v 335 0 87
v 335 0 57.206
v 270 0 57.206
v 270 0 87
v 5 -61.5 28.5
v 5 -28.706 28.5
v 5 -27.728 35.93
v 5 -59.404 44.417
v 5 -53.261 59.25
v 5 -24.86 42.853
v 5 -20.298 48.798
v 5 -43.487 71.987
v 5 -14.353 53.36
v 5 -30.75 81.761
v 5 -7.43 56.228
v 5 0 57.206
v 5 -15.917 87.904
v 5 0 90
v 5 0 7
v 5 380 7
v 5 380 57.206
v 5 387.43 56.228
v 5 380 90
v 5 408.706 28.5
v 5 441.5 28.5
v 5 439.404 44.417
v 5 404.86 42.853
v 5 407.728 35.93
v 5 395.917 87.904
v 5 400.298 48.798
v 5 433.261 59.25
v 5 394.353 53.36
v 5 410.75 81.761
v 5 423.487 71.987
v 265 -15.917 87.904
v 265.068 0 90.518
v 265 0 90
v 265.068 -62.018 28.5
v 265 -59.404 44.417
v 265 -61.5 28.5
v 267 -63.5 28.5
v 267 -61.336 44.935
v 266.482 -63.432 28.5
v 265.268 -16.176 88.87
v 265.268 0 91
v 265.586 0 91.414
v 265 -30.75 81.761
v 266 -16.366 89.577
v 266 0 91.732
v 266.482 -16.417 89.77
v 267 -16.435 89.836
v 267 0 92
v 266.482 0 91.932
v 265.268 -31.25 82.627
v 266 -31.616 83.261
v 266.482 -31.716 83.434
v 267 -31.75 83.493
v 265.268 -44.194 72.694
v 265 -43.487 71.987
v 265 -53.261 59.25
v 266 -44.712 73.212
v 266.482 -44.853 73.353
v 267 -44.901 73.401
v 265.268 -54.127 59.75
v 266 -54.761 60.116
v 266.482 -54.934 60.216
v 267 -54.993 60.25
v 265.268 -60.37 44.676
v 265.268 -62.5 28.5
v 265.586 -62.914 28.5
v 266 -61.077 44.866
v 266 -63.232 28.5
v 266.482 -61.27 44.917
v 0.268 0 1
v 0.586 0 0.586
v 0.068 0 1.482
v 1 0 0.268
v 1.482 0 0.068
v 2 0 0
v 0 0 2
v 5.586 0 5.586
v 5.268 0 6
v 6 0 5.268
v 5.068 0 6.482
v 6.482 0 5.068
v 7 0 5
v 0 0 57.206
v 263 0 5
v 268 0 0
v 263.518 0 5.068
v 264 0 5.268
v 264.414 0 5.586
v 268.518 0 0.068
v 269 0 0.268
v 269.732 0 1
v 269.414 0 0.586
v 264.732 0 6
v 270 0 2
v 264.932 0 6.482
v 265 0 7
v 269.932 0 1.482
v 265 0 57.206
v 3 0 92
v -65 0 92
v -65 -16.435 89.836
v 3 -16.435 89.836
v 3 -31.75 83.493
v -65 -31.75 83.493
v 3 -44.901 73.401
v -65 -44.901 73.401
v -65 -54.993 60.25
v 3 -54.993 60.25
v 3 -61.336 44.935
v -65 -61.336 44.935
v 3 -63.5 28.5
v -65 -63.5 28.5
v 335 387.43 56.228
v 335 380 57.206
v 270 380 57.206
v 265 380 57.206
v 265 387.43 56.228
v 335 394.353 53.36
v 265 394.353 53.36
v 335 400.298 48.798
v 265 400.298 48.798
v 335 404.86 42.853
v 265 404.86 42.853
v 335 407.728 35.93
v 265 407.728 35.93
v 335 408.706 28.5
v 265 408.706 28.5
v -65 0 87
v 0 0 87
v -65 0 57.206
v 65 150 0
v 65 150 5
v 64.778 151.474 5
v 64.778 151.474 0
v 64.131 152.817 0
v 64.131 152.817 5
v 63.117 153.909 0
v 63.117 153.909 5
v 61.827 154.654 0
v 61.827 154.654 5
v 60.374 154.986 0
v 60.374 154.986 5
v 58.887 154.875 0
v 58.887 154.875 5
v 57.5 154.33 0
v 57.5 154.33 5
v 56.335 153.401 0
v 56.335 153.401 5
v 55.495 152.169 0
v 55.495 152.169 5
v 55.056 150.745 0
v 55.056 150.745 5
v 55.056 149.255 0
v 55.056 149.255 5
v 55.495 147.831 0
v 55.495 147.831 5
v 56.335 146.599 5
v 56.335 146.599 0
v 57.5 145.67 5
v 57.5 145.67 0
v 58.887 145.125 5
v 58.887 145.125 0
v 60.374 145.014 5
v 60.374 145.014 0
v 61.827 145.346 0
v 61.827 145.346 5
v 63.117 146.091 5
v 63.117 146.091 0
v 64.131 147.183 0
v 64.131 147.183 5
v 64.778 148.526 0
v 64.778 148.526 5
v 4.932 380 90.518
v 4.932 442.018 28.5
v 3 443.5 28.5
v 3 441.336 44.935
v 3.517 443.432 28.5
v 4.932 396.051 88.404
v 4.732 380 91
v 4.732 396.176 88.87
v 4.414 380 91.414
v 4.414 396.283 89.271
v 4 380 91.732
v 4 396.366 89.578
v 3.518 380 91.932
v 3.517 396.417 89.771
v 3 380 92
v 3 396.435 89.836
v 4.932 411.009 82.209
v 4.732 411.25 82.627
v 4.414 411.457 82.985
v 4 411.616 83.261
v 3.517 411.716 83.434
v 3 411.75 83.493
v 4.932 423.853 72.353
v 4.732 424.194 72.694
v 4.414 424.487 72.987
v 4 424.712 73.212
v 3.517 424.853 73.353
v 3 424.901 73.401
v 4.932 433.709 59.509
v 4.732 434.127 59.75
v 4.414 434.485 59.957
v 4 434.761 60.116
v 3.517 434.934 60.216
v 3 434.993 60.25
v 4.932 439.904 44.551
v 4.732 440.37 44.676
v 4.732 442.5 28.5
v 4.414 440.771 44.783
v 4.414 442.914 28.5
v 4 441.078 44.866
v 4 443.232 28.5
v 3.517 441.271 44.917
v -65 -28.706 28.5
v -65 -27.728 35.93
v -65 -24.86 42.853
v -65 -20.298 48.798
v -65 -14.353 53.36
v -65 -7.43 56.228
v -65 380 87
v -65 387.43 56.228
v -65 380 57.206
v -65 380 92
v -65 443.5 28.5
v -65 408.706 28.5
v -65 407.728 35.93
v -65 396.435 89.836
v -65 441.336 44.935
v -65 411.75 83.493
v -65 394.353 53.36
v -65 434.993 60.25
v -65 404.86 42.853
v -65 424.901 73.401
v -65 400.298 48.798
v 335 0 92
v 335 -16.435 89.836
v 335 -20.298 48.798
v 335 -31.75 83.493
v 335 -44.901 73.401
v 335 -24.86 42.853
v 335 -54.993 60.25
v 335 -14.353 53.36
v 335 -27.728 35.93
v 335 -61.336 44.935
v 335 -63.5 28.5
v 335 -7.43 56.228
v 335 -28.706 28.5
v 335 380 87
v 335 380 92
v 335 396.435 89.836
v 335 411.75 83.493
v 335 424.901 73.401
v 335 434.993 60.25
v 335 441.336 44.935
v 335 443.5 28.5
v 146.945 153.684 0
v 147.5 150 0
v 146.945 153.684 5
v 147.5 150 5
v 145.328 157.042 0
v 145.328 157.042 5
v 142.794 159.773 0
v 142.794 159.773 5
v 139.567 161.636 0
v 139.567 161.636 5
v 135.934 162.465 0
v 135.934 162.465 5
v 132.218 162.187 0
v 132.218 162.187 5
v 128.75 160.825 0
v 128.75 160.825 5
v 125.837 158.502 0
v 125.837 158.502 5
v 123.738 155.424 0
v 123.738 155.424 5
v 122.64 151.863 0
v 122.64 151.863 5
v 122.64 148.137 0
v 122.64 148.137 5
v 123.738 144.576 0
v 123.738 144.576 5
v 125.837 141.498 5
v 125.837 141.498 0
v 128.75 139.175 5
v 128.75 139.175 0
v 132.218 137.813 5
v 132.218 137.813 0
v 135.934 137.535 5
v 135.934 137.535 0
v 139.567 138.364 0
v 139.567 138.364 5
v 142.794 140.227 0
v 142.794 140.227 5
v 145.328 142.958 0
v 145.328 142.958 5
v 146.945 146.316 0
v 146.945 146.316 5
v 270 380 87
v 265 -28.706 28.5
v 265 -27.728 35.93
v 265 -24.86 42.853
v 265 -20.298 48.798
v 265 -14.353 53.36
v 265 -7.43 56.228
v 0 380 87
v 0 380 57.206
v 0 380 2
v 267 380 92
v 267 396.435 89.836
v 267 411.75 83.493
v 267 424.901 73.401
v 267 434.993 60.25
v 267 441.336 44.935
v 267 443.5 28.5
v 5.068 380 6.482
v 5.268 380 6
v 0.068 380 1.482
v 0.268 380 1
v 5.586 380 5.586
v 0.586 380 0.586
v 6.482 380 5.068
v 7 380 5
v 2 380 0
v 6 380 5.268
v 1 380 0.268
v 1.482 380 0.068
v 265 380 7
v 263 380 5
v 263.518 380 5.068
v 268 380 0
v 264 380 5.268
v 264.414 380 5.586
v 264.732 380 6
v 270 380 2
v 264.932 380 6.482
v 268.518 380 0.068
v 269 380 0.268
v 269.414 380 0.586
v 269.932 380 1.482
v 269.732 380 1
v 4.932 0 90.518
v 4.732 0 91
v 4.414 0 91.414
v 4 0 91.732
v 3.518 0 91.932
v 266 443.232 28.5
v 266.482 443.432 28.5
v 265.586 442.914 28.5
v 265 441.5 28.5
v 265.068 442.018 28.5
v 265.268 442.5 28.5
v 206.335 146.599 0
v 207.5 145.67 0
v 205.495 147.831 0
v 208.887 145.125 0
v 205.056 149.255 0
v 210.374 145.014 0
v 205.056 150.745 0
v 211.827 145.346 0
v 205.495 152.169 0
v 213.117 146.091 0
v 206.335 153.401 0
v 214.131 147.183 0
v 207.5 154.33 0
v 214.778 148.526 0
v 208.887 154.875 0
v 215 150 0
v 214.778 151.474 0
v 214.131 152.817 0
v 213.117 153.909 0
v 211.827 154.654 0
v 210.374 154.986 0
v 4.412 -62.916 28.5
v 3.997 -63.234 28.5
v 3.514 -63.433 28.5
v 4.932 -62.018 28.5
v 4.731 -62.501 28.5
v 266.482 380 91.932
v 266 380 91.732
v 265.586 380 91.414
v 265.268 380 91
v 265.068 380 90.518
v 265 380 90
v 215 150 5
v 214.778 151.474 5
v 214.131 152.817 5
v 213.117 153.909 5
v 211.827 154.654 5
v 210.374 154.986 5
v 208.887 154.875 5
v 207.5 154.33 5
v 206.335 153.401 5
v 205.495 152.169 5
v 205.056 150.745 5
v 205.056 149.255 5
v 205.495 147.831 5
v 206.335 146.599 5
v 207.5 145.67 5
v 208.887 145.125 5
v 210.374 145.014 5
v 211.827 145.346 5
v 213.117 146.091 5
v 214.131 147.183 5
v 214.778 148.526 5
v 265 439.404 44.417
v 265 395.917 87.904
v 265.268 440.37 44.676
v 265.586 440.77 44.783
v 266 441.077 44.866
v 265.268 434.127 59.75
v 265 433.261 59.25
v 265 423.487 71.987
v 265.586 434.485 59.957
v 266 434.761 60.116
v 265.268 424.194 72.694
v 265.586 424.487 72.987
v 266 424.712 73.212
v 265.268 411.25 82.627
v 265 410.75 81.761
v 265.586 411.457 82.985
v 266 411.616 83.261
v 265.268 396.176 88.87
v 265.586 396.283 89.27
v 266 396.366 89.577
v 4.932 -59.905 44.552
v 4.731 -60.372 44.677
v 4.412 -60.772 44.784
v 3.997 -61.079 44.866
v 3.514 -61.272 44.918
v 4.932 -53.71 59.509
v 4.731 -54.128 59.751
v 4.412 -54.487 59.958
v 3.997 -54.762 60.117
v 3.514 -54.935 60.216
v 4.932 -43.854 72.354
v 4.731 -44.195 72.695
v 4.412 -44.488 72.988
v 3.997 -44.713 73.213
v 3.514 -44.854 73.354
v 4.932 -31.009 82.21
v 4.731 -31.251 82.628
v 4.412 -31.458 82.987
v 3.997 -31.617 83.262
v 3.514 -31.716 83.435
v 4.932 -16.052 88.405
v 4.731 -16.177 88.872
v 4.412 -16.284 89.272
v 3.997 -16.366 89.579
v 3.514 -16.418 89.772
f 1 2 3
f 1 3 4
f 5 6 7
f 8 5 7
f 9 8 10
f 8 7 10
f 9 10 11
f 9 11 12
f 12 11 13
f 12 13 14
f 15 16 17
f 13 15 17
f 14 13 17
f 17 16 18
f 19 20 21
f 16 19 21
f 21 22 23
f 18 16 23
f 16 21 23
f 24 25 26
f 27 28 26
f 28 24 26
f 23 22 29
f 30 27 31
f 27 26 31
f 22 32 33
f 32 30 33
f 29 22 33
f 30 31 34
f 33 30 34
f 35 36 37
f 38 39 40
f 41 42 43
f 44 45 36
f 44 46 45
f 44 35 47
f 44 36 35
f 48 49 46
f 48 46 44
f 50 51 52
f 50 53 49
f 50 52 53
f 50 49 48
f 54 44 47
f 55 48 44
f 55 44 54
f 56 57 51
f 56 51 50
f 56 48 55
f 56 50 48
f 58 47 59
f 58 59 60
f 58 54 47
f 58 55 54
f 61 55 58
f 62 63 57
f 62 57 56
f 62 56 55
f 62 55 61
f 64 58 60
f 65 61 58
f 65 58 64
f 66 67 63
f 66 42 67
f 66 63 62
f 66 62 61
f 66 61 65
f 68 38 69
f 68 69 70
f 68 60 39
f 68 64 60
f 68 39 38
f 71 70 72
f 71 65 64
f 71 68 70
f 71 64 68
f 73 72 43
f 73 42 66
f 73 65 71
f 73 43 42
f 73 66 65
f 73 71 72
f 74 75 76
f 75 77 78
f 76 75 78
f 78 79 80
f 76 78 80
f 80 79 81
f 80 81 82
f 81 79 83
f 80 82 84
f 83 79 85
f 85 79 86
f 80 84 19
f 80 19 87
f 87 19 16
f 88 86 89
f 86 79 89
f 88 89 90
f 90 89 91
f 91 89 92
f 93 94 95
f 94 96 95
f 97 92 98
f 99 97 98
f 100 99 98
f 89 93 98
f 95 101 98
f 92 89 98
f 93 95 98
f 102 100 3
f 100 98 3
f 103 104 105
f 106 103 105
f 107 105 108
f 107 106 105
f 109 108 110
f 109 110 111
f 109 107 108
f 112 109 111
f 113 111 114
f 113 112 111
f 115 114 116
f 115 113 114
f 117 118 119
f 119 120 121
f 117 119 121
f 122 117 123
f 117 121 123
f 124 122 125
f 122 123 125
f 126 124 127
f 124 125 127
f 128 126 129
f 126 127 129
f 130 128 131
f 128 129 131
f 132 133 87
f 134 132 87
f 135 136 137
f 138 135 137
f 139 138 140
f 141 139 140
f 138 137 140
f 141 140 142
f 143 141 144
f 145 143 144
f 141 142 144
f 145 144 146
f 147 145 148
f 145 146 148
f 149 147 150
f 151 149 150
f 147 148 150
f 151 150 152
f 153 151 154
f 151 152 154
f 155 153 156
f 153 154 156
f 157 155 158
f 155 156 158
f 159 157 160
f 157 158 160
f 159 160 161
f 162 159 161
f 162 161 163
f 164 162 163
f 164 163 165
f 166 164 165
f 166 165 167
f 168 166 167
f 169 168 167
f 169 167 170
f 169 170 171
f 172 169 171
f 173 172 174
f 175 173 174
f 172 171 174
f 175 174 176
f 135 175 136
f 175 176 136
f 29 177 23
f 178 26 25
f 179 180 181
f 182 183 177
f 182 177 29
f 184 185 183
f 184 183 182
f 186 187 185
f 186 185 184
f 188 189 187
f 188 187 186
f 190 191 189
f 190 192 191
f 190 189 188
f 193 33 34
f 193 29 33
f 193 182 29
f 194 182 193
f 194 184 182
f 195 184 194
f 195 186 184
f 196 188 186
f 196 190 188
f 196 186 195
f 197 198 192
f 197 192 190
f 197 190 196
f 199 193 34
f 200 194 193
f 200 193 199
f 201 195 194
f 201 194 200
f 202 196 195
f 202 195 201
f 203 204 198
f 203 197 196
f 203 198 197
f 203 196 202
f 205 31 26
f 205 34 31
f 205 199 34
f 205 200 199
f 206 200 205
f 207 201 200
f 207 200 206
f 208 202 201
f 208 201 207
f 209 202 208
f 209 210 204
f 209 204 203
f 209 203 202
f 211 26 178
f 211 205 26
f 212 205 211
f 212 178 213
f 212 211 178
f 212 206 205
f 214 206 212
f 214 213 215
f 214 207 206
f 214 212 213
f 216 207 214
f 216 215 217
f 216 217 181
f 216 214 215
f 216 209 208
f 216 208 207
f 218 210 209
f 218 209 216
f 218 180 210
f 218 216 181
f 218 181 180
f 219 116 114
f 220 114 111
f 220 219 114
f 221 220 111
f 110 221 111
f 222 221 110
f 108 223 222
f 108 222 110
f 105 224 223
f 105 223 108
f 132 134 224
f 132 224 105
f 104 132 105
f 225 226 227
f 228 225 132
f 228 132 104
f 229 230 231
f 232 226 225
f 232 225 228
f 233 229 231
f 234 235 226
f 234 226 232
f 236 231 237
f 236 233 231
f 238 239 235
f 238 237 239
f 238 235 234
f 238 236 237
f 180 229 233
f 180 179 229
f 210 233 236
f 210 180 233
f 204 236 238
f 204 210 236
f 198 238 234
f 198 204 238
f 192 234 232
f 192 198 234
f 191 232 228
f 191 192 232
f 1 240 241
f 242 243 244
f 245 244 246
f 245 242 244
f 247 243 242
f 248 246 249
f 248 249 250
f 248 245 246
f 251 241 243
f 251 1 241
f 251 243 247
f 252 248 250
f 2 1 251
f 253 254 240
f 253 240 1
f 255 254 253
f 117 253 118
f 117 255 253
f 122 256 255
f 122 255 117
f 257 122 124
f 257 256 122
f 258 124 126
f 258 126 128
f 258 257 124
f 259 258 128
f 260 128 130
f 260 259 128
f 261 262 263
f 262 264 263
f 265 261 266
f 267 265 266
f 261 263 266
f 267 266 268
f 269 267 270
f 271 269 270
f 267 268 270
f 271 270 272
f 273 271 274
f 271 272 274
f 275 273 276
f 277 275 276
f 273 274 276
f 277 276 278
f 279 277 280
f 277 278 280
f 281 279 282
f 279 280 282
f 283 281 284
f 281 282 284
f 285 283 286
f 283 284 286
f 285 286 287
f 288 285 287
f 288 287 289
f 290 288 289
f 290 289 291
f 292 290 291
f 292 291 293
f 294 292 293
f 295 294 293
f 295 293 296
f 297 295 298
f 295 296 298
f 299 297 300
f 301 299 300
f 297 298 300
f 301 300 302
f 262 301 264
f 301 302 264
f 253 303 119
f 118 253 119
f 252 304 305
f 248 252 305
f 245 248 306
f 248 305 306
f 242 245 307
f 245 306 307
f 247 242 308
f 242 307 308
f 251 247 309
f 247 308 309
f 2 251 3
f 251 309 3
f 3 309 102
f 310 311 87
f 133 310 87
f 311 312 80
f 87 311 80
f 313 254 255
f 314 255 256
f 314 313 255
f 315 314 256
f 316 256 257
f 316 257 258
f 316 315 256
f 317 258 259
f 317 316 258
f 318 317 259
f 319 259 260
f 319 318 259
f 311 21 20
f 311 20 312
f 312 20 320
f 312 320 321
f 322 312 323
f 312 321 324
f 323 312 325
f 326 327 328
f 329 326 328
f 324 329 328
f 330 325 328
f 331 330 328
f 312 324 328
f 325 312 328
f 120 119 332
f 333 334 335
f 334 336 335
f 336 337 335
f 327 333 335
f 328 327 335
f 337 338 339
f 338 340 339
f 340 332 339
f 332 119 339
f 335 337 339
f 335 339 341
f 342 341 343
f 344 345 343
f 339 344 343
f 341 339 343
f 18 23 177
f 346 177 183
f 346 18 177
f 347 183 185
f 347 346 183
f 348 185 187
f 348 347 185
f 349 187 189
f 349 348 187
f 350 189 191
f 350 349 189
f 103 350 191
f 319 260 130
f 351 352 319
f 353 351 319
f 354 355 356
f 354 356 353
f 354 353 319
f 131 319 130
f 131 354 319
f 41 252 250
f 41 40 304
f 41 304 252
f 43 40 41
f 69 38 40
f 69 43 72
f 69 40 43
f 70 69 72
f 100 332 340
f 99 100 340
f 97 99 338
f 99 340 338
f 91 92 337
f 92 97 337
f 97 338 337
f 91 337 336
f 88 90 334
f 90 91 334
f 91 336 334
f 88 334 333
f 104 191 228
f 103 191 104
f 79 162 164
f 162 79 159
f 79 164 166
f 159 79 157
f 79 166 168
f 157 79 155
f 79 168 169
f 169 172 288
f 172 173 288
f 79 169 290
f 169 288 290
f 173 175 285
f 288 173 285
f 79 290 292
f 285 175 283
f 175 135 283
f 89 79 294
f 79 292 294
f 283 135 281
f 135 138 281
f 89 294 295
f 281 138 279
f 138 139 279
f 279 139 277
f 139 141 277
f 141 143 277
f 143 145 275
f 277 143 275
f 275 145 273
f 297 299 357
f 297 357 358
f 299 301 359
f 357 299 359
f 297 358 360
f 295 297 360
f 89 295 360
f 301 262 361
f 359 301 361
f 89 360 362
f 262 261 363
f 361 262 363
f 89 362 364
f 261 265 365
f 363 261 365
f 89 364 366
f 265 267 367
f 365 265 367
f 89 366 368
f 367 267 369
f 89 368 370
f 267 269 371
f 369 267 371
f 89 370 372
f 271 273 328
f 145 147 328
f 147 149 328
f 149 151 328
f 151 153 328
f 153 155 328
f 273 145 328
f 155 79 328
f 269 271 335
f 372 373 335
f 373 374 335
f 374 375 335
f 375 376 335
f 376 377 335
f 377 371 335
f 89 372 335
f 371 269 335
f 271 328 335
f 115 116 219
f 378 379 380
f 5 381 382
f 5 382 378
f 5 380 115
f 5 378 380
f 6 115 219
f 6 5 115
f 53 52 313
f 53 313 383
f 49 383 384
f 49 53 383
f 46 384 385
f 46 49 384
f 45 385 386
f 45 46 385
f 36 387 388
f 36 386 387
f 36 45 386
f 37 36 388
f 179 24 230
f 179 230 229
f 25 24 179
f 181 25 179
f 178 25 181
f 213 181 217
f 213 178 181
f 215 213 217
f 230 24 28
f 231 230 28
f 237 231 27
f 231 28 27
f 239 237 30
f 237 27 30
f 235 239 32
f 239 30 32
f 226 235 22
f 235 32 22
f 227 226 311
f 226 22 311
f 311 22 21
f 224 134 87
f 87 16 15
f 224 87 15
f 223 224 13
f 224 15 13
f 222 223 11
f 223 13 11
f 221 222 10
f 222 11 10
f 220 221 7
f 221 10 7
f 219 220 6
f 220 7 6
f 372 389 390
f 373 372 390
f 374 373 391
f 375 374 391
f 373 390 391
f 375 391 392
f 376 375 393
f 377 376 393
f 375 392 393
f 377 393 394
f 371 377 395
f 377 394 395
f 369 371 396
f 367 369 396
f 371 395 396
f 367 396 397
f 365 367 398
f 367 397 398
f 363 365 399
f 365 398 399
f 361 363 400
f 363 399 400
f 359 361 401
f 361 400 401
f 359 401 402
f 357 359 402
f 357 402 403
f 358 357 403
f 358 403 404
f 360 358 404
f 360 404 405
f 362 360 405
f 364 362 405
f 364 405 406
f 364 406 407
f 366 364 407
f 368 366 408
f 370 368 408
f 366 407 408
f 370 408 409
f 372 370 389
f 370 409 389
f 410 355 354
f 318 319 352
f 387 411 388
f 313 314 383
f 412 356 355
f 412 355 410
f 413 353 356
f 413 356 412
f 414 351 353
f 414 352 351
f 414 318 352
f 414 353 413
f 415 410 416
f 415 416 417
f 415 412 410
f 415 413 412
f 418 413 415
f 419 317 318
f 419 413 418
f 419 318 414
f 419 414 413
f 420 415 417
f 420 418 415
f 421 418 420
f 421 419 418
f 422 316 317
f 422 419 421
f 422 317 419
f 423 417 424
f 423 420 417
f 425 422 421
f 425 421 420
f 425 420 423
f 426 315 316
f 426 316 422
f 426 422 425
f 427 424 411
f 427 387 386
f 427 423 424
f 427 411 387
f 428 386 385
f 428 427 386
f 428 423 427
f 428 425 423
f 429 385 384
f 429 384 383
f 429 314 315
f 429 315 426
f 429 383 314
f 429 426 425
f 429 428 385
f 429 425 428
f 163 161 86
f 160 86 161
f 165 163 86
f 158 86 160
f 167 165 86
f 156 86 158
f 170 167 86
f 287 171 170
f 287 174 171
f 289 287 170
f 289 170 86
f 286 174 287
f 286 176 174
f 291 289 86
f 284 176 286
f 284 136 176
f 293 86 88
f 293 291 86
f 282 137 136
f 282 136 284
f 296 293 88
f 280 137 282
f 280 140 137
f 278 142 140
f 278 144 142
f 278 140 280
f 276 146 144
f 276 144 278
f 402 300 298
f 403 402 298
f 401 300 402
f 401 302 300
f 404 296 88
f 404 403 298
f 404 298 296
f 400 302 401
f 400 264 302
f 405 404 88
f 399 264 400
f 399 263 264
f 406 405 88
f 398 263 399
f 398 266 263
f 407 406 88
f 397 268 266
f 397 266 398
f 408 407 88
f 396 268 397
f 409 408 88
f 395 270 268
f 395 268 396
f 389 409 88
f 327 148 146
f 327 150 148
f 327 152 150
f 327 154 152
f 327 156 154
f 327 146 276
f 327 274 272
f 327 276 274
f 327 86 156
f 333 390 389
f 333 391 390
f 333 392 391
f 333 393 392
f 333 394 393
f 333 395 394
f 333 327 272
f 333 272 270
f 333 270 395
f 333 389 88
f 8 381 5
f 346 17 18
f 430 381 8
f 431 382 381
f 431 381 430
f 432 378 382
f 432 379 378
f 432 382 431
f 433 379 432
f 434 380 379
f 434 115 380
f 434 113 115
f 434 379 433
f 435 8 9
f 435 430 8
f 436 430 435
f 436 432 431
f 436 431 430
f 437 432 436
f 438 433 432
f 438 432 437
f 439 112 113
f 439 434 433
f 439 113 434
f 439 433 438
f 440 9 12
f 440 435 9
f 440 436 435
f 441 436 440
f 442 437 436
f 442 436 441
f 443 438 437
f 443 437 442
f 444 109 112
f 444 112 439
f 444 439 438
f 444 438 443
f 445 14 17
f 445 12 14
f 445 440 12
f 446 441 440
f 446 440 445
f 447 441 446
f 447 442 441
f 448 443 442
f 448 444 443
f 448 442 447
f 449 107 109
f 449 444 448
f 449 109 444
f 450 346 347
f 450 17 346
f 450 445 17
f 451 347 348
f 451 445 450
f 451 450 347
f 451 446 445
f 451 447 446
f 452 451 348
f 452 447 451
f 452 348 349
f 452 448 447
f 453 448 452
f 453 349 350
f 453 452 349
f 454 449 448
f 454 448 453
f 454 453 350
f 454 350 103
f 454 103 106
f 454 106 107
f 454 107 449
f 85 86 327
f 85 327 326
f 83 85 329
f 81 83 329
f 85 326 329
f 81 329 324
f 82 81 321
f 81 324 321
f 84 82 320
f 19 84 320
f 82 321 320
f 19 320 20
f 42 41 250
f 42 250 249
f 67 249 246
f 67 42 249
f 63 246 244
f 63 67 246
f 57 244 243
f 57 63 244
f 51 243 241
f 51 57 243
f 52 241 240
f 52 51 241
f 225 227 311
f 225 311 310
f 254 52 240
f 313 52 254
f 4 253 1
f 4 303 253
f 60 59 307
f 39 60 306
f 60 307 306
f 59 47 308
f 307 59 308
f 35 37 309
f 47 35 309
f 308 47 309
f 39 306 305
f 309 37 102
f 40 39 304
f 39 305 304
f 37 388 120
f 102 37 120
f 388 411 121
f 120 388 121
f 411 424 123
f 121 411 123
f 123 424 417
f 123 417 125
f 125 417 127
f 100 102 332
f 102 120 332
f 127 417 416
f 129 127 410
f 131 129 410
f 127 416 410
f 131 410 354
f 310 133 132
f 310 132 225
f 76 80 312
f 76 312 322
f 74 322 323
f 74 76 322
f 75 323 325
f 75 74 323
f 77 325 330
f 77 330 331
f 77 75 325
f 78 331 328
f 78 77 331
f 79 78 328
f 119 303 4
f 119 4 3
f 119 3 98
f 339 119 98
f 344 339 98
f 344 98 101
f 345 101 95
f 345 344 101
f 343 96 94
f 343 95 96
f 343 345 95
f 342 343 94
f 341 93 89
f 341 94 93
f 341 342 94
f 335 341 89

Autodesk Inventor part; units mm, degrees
ref_plane "XY Plane" through (0, 0, 0) normal (0, 0, 1) x (1, 0, 0)
sketch "Sketch1" plane through (0, 0, 0) normal (0, 0, 1) x (1, 0, 0)
  line L0 (0, 0) -> (270, 0)
  line L1 (270, 0) -> (270, 380)
  line L2 (270, 380) -> (0, 380)
  line L3 (0, 380) -> (0, 0)
  dimension "d0" = 270
  dimension "d1" = 380
extrude "Extrusion1" add sketch "Sketch1" along normal blind 5
sketch "Sketch4" plane through (0, 0, 0) normal (-1, 0, 0) x (0, 0, 1)
  line L0 (0, 0) -> (0, 380) projected
  line L1 (-3.8919, 9.8795) -> (0, 9.8795)
  line L2 (0, 9.8795) -> (0, 5.6882)
  line L3 (0, 5.6882) -> (-3.8919, 5.6882)
  line L4 (-3.8919, 5.6882) -> (-3.8919, 9.8795)
  line L5 (5, 0) -> (5, 380) projected
  line L6 (5, 380) -> (87, 380)
  line L7 (87, 380) -> (87, 0)
  line L8 (87, 0) -> (5, 0)
  line L9 (5, 0) -> (5, 380)
  dimension "d4" = 82
  dimension "d5" = 380
extrude "Extrusion2" add sketch "Sketch4" against normal blind 5 contours L5 L6 L7 L8
sketch "Sketch7" plane through (0, 0, 0) normal (-1, 0, 0) x (0, 0, 1)
  line L0 (0, 380) -> (87, 380) projected
  line L1 (87, 380) -> (92, 380)
  line L2 (92, 380) -> (92, 0)
  line L3 (92, 0) -> (87, 0)
  line L4 (87, 0) -> (87, 380)
  point P0 (0, 0)
  dimension "d8" = 5
  dimension "d9" = 380
extrude "Extrusion3" add sketch "Sketch7" along normal blind 65 and the other way blind 5
sketch "Sketch8" plane through (0, 0, 0) normal (-1, 0, 0) x (0, 0, 1)
  line L0 (0, 380) -> (5, 380) projected
  line L1 (0, 380) -> (0, 390)
  line L2 (0, 390) -> (1.5922, 390)
  line L3 (5, 380) -> (92, 380) projected
  arc A0 (92, 380) -> (28.5, 443.5) centre (28.5, 380) ccw
  line L4 (28.5, 408.706) -> (28.5, 443.5)
  line L5 (57.206, 380) -> (92, 380)
  arc A1 (57.206, 380) -> (28.5, 408.706) centre (28.5, 380) ccw
  arc A2 (1.5922, 390) -> (0, 383.4325) centre (28.5, 380) ccw
  point P0 (0, 0)
  dimension "d14" = 10
extrude "Extrusion4" add sketch "Sketch8" along normal blind 65 and the other way blind 5 contours A1 L4 A0 L3
ref_plane "Work Plane1" through (0, 190, 0) normal (0, 1, 0) x (-1, 0, 0)
mirror "Mirror1" about plane through (0, 190, 0) normal (0, 1, 0) of "Extrusion4"
ref_plane "Work Plane3" through (135, 0, 0) normal (1, 0, 0) x (0, 1, 0)
mirror "Mirror2" about plane through (135, 0, 0) normal (1, 0, 0) of "Extrusion4", "Extrusion3", "Mirror1", "Extrusion2"
fillet "Fillet1" radius 2 3 edges at (5, -44.9013, 73.4013) (5, 424.9013, 73.4013) (5, 190, 92)
fillet "Fillet2" radius 2 3 edges at (265, 190, 92) (265, -44.9013, 73.4013) (265, 424.9013, 73.4013)
fillet "Fillet3" radius 2 1 edges at (5, 190, 5)
fillet "Fillet4" radius 2 1 edges at (265, 190, 5)
fillet "Fillet5" radius 2 1 edges at (0, 190, 0)
fillet "Fillet6" radius 2 1 edges at (270, 190, 0)
sketch "Sketch9" plane through (0, 0, 5) normal (0, 0, 1) x (1, 0, 0)
  line L0 (7, 0) -> (263, 0) construction
  line L1 (135, 0) -> (135, 150) construction
  circle A0 centre (135, 150) radius 12.5
  line L2 (135, 150) -> (258, 150) construction
  line L3 (135, 150) -> (12, 150) construction
  circle A1 centre (210, 150) radius 5
  circle A2 centre (60, 150) radius 5
  line L4 (5, 0) -> (5, 380) projected
  line L5 (265, 380) -> (265, 0) projected
  point P0 (0, 0)
  dimension "d27" = 150
  dimension "d28" = 25
  dimension "d31" = 10
  dimension "d32" = 10
  dimension "d33" = 55
  dimension "d34" = 55
extrude "Extrusion5" cut sketch "Sketch9" against normal through all
properties part number "body base" material "Steel, Alloy"
